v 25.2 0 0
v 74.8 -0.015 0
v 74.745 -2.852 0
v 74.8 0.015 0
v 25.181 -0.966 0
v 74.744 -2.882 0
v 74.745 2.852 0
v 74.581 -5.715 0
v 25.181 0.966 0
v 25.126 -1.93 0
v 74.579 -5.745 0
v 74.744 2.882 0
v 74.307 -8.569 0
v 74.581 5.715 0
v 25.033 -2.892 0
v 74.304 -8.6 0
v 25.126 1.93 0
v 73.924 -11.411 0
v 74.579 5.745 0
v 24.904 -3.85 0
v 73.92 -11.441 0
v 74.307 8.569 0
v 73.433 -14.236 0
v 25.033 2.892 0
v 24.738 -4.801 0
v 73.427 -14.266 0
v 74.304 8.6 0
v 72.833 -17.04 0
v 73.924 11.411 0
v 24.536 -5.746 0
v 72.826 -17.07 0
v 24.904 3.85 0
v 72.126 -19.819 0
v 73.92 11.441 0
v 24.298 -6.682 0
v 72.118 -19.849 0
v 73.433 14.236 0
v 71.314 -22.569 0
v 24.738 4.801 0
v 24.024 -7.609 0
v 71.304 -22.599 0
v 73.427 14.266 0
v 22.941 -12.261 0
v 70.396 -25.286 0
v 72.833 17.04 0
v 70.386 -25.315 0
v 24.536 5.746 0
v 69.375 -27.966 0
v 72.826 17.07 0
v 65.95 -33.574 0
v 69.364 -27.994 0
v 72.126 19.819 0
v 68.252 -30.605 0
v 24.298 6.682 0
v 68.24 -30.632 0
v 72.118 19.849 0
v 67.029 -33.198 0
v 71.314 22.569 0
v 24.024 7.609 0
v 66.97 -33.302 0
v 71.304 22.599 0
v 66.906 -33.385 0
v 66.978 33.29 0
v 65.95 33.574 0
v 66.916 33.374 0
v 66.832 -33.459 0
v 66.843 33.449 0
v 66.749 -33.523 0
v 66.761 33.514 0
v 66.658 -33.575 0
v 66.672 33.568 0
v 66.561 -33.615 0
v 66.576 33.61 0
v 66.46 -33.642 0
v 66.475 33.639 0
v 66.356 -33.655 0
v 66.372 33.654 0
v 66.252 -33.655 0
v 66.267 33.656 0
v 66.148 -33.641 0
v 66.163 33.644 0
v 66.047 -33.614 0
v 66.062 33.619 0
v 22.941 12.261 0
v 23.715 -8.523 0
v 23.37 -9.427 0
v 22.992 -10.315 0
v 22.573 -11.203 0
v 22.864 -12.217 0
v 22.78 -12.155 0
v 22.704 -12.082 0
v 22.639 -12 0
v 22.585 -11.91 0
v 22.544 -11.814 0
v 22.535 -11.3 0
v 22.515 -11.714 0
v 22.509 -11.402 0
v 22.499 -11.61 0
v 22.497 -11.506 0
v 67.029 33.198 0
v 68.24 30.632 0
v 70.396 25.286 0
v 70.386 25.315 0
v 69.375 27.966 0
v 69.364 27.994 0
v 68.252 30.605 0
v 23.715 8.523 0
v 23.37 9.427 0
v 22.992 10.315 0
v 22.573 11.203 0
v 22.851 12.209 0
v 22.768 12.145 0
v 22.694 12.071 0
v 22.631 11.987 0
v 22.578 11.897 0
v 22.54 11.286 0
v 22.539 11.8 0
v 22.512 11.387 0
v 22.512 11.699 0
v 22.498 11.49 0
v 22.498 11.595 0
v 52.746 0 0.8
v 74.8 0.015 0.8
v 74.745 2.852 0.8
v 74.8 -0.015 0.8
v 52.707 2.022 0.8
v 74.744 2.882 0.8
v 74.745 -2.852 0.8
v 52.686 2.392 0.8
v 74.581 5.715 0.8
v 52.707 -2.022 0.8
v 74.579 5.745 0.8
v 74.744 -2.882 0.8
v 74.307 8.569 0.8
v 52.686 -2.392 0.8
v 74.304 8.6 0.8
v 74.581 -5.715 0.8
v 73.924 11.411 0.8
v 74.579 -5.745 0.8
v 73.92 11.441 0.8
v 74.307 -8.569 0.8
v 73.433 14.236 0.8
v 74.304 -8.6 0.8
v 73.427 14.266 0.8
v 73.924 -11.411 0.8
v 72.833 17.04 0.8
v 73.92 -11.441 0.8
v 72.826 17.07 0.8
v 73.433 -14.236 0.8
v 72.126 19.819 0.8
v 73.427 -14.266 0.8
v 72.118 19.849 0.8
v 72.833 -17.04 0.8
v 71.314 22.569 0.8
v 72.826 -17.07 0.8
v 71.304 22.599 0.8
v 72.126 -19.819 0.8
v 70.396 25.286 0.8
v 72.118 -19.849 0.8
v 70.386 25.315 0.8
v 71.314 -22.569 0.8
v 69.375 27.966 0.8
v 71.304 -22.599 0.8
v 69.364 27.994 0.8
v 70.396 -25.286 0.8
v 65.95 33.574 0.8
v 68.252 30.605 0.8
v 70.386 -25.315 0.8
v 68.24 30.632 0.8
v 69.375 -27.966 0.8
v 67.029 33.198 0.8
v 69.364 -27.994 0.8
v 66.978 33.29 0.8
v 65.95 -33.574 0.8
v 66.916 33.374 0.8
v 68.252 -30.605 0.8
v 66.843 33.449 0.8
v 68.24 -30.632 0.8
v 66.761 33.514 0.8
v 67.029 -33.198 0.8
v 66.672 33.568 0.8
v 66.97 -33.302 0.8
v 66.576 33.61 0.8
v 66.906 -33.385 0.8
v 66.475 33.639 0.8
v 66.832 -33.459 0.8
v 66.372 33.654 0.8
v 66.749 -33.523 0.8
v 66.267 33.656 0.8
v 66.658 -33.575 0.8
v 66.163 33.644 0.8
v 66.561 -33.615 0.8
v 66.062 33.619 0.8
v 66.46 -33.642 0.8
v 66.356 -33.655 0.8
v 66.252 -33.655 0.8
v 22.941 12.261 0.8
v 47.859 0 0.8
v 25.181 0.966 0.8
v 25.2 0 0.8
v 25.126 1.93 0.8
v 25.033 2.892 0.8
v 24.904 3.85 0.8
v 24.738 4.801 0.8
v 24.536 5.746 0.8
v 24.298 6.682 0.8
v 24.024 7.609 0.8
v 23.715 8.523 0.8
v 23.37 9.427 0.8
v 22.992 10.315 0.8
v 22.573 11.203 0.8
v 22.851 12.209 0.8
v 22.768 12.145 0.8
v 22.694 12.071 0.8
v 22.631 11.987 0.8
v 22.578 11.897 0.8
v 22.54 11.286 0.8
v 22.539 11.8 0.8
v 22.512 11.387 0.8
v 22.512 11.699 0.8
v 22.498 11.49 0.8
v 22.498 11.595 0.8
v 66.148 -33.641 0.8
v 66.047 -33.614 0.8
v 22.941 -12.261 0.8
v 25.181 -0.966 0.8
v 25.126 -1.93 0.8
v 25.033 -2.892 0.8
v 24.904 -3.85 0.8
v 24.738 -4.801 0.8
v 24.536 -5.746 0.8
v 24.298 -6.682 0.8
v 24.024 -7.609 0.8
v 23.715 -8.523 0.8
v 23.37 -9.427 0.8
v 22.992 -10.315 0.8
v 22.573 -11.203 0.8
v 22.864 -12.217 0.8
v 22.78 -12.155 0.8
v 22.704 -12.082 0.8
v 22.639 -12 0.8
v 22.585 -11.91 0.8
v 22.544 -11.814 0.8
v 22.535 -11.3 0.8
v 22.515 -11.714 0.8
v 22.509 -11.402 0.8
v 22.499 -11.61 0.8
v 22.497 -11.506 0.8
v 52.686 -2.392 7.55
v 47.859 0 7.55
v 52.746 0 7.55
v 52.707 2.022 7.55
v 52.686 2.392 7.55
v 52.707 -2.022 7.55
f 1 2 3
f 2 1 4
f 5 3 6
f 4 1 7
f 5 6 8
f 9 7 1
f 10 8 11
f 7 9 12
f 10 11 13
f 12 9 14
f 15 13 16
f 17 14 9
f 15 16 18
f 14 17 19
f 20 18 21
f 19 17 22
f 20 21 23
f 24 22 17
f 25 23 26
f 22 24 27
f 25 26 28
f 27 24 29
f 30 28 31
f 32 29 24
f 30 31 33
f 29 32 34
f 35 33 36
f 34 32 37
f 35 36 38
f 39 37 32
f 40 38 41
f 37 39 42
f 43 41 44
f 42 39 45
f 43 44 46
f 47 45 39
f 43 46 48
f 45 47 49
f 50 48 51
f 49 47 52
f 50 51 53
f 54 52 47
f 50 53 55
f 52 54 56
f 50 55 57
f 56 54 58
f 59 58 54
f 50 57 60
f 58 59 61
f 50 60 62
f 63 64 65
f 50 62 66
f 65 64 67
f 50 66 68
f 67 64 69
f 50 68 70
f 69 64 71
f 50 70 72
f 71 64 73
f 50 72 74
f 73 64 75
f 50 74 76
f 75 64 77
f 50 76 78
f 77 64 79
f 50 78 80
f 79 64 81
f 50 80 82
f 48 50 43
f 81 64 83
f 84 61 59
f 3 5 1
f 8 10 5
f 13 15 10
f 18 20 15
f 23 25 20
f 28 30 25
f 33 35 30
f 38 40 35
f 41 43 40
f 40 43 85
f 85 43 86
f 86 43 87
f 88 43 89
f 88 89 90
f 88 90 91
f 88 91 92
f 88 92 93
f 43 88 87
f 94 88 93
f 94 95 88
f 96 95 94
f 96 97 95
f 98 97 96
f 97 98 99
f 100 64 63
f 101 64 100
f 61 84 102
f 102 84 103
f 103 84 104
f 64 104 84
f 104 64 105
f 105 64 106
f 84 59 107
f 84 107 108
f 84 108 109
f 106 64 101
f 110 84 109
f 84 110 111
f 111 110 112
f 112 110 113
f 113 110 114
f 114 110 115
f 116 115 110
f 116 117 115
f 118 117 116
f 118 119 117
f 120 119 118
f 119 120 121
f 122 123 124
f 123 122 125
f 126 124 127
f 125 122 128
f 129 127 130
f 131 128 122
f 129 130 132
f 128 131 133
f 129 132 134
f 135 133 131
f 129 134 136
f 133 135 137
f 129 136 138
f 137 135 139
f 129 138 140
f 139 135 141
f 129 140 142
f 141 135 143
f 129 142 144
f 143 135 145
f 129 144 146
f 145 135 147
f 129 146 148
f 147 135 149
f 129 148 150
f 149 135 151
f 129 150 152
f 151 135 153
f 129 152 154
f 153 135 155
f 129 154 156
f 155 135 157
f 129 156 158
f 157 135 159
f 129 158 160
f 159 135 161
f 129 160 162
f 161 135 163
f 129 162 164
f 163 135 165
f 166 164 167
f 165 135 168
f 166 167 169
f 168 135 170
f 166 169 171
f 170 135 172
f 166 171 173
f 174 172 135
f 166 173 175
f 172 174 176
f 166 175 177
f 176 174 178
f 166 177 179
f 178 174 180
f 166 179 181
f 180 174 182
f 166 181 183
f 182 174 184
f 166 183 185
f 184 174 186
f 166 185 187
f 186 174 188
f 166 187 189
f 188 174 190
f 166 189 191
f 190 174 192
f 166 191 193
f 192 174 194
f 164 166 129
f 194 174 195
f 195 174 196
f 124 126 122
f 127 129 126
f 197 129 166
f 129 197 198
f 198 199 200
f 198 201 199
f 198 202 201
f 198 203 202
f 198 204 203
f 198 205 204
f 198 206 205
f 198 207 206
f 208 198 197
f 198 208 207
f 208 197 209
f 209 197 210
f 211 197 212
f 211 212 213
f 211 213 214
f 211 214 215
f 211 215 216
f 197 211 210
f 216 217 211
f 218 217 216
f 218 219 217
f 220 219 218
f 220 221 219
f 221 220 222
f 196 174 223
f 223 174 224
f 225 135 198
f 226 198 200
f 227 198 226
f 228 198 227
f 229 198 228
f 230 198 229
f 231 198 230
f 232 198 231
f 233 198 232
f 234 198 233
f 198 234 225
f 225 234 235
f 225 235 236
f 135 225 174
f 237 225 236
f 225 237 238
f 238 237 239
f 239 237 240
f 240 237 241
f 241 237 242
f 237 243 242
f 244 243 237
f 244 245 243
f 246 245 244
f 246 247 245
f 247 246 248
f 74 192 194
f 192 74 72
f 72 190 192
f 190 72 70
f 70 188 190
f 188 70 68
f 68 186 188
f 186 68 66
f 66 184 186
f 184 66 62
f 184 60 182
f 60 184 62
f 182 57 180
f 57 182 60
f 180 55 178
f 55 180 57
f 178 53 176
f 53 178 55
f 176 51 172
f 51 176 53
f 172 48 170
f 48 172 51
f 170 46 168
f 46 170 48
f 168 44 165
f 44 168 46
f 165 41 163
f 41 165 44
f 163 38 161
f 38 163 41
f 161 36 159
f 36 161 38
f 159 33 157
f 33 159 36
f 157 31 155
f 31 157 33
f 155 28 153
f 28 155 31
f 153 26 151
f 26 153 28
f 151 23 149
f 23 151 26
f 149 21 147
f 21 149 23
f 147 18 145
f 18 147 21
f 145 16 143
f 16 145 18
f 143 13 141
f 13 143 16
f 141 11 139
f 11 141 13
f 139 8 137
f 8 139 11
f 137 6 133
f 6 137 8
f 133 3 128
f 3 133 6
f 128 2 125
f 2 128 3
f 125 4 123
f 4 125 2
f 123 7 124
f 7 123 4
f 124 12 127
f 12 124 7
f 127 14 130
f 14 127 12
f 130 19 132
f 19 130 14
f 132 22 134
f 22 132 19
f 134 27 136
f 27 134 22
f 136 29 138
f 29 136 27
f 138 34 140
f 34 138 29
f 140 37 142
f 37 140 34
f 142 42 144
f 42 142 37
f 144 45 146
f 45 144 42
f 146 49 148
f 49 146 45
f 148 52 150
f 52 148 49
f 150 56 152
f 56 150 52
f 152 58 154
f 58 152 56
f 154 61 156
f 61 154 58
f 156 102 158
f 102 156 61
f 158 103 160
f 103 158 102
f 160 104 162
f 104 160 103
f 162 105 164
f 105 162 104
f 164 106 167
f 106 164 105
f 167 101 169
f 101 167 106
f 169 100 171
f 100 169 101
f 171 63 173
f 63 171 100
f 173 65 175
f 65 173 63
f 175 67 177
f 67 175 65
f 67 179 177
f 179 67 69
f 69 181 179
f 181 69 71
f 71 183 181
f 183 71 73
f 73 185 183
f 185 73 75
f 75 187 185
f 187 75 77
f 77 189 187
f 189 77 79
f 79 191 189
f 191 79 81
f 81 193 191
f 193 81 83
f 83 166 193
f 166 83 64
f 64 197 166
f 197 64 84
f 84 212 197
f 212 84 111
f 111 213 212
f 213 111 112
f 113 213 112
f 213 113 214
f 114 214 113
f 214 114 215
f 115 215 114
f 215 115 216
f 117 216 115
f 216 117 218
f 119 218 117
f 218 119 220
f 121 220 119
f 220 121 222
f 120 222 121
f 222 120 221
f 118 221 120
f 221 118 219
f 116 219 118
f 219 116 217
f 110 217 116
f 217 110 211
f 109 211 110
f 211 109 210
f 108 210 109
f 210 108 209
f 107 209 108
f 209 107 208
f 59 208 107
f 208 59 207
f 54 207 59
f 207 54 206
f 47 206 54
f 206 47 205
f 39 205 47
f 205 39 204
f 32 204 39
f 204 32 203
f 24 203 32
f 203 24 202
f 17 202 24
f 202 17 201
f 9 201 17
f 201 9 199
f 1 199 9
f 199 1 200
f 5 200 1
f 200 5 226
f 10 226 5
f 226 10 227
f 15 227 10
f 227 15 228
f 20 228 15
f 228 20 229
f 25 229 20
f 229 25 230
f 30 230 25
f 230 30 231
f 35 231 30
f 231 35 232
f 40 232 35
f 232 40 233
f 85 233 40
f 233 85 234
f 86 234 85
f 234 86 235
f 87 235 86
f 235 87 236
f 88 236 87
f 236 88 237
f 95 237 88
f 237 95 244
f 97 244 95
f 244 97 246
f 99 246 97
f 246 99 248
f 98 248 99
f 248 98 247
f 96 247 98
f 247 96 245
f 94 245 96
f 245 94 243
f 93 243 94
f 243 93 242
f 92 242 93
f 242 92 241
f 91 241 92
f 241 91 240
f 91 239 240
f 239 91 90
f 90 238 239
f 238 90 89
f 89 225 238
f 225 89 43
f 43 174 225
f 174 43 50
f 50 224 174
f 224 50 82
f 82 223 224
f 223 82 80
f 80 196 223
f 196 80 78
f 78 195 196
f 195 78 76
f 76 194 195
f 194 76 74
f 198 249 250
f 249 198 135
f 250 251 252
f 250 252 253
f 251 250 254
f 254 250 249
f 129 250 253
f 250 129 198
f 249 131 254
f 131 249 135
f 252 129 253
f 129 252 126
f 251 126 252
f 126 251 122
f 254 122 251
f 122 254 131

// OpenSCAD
// file: parameters.scad
// =============================================================================
// Gen-BW — nightly 2026-10-10 (physics_scorer, honest magpylib watts)
// Stacked poles: two Ø20×5 per pocket (10 mm poles), 4 per rotor at R52, trading pole count for field — peak Bz at the copper rises to ≈0.73 T (vs 0.54 T on Gen-BR), which lets a thin 6.75 mm copper layer with a very deep 21 mm build carry the turns. But the electrical frequency halves, and the scorer puts it at about 45 % of Gen-BR: the thicker magnets do not make up for half the poles.
// Clocking 0 deg (magnets N facing S) + D-flat keyed bore + index notch + flip-symmetric hole map.
// Windable 2-piece bobbin; turns = physics_scorer turns_fit; copper only between flanges.
// Steel back-iron: 2× Ø134 × 6.35 mm (1/4") mild-steel discs (steel_backiron_disc.dxf); magnets sit ON the steel
// (through-pockets) -> score with --back-iron. Night 2026-10-10.
// =============================================================================
topology            = "dual_rotor";

// --- Wire / winding (physics_scorer winding-fit) -------------------------------
wire_awg            = 26;
wire_od             = 0.45;     // insulated OD mm (bare 0.405)
fill_realistic      = 0.65;     // insulated-wire area / window (DENSE layered wind with a jig; scorer cap 0.65)
turns               = 586;       // = physics_scorer turns_fit (do NOT raise)
coil_former_type    = "bobbin";
coil_core_inset     = 21.25;     // radial copper build: hub = copper boundary inset by this
wind_build_axial    = 0.0;      // nothing proud of the flanges
wind_build_radial   = 0.0;

// --- Bobbin (base + lid) ---------------------------------------------------------
coil_id_r           = 26.00;    // copper boundary sector
coil_od_r           = 74.00;
span_deg            = 52.72;    // = pitch - 2*asin((wall+0.85)/coil_id_r) -> >=1.2 mm stator web
former_web          = 6.75;     // copper height between flanges (TALL copper: steel keeps Bz up)
flange_t            = 0.80;     // >= 0.8 mm FDM wall rule (tall winds push on the flanges)
wall                = 0.80;     // flange lip beyond copper
former_bare_h       = former_web + 2 * flange_t;
coil_envelope_h     = former_bare_h + 2 * wind_build_axial;
tab_w               = 7.0;
tab_len             = 7.0;
tab_h               = former_bare_h / 2;
pin_d               = 1.9;      // 1.75 mm filament locating pin
coil_mount_r        = coil_od_r + 0.2 + 4.0;
lead_y              = 1.6;
lead_slot_w         = 0.9;
lead_groove_d       = 0.6;

// --- Gap -------------------------------------------------------------------------
run_clear           = 0.50;     // rotor face -> flange
gap_spacer_h        = run_clear + wind_build_axial;
m2m                 = coil_envelope_h + 2 * run_clear;   // rotor face to rotor face (= gap_sleeve length)

// --- Stator ----------------------------------------------------------------------
coil_stations       = 6;
bay_clear           = 0.25;
stator_thick        = former_bare_h;                        // bobbins flush both faces
stator_od           = 166;
shaft_clear_stator  = 14.0;     // stator is static; gap sleeve OD 12 spins inside

// --- Rotor(s) --------------------------------------------------------------------
magnet_Br           = 1.43;     // N52
magnet_d_large      = 20.0;
magnet_h_large      = 10.0;      // two O20x5 stacked per pocket
magnet_h_small      = 5.0;      // unused: no O5 pockets in this kit
halbach_magnetisation = "none";  // NO O5 assist magnets in this kit (scan: they lower the 4-pole score)
rotor_b_same_axis   = true;     // same-index magnets share one axis: N faces S across the gap
large_pocket_d      = 20.3;
small_pocket_d      = 5.3;
pocket_h            = 10.00;     // THROUGH the carrier: magnet back face sits on the steel disc (FLUSH seat: carrier = magnet height, magnet face level with the rotor face)
large_n             = 4;
R_large             = 52.0;
small_r_list        = [];       // no O5 pockets
carrier_od          = 134.0;
carrier_thick       = pocket_h;
hub_h               = 14.0;     // > steel_t + insert: radial set-screw clears the steel
hub_od              = 24.0;     // slim hub so the M4 brace rods fit at R~18 inside the coil ring
hub_insert_d        = 4.0;      // M3 heat-set insert, radial, bears on the D-flat
rotor_b_offset_deg  = 0.0;      // CLOCKING: magnets directly opposite
shaft_key           = "dflat";
dflat_depth         = 0.5;      // 8 mm shaft with 0.5 mm flat (7.5 across flat)
index_notch_d       = 3.0;

// --- Steel back-iron (buyable laser-cut) -------------------------------------------
steel_t             = 6.35;      // mild steel thickness (image method ignores it; sized from steel_flux.py so the return path stays well below saturation)
steel_center_hole   = 26.0;     // slips over the rotor hub (OD 24)
steel_od            = carrier_od;   // steel disc OD = rotor carrier OD

// --- Modular MAX interface ----------------------------------------------------------
shaft_bore          = 8.35;
dflat_x             = 4.0 - dflat_depth + (shaft_bore - 8.0) / 2;
bearing_d           = 21.85;
bearing_h           = 7.2;
m3_clear            = 3.5;
bolt_r_inner        = 30.0;     // M3 steel-disc clamp bolts (inside the magnet ring)
bolt_n_inner        = 4;
bolt_inner_angles   = [0, 90, 180, 270];
bolt_r_outer        = 63.0;     // second M3 steel-disc clamp ring
bolt_outer_angles   = [45, 135, 225, 315];
flange_bolt_r       = 73.0;     // frame rods: OUTSIDE the rotor OD (rotors spin inside them)
flange_bolt_n       = 6;
flange_bolt_offset  = 30.00;    // between coil stations -> never cuts a lead groove/tab
brace_r             = 18.0;
brace_d             = 4.3;      // temporary M4 jack rods (assembly only)
brace_n             = 4;
brace_angles        = [45, 135, 225, 315];          // flip-symmetric

spacer_pad_od       = 14.0;
spacer_pad_id       = m3_clear;
endbell_od          = 156.0;
endbell_thick       = 8.0;
endbell_shaft_clear = 10.0;
collar_h            = 10.0;
standoff_od         = 9.0;
frame_standoff_h    = run_clear + carrier_thick + hub_h + collar_h + 2.0;
sleeve_od           = 12.0;
plate_max_mm        = 410;

$fn = 64;
// main file
// Gen-BW — bobbin BASE (bottom flange + hub). Print x6, flange down. Wind 26 AWG x 586 t around
// the hub with the LID glued on (coil_lid.stl). Copper lives ONLY between the flanges (no proud winds).
include <parameters.scad>;
$fn = 48;
module sector_2d(r_in, r_out, ang) {
    polygon([
        for (a = [-ang/2 : ang/24 : ang/2]) [r_in*cos(a), r_in*sin(a)],
        for (a = [ang/2 : -ang/24 : -ang/2]) [r_out*cos(a), r_out*sin(a)]
    ]);
}
module footprint_2d() { offset(r=wall) sector_2d(coil_id_r, coil_od_r, span_deg); }
module hub_2d()       { offset(delta=-coil_core_inset) sector_2d(coil_id_r, coil_od_r, span_deg); }

union() {
    linear_extrude(flange_t) footprint_2d();
    translate([0, 0, flange_t - 0.01]) linear_extrude(former_web + 0.01) hub_2d();
}
